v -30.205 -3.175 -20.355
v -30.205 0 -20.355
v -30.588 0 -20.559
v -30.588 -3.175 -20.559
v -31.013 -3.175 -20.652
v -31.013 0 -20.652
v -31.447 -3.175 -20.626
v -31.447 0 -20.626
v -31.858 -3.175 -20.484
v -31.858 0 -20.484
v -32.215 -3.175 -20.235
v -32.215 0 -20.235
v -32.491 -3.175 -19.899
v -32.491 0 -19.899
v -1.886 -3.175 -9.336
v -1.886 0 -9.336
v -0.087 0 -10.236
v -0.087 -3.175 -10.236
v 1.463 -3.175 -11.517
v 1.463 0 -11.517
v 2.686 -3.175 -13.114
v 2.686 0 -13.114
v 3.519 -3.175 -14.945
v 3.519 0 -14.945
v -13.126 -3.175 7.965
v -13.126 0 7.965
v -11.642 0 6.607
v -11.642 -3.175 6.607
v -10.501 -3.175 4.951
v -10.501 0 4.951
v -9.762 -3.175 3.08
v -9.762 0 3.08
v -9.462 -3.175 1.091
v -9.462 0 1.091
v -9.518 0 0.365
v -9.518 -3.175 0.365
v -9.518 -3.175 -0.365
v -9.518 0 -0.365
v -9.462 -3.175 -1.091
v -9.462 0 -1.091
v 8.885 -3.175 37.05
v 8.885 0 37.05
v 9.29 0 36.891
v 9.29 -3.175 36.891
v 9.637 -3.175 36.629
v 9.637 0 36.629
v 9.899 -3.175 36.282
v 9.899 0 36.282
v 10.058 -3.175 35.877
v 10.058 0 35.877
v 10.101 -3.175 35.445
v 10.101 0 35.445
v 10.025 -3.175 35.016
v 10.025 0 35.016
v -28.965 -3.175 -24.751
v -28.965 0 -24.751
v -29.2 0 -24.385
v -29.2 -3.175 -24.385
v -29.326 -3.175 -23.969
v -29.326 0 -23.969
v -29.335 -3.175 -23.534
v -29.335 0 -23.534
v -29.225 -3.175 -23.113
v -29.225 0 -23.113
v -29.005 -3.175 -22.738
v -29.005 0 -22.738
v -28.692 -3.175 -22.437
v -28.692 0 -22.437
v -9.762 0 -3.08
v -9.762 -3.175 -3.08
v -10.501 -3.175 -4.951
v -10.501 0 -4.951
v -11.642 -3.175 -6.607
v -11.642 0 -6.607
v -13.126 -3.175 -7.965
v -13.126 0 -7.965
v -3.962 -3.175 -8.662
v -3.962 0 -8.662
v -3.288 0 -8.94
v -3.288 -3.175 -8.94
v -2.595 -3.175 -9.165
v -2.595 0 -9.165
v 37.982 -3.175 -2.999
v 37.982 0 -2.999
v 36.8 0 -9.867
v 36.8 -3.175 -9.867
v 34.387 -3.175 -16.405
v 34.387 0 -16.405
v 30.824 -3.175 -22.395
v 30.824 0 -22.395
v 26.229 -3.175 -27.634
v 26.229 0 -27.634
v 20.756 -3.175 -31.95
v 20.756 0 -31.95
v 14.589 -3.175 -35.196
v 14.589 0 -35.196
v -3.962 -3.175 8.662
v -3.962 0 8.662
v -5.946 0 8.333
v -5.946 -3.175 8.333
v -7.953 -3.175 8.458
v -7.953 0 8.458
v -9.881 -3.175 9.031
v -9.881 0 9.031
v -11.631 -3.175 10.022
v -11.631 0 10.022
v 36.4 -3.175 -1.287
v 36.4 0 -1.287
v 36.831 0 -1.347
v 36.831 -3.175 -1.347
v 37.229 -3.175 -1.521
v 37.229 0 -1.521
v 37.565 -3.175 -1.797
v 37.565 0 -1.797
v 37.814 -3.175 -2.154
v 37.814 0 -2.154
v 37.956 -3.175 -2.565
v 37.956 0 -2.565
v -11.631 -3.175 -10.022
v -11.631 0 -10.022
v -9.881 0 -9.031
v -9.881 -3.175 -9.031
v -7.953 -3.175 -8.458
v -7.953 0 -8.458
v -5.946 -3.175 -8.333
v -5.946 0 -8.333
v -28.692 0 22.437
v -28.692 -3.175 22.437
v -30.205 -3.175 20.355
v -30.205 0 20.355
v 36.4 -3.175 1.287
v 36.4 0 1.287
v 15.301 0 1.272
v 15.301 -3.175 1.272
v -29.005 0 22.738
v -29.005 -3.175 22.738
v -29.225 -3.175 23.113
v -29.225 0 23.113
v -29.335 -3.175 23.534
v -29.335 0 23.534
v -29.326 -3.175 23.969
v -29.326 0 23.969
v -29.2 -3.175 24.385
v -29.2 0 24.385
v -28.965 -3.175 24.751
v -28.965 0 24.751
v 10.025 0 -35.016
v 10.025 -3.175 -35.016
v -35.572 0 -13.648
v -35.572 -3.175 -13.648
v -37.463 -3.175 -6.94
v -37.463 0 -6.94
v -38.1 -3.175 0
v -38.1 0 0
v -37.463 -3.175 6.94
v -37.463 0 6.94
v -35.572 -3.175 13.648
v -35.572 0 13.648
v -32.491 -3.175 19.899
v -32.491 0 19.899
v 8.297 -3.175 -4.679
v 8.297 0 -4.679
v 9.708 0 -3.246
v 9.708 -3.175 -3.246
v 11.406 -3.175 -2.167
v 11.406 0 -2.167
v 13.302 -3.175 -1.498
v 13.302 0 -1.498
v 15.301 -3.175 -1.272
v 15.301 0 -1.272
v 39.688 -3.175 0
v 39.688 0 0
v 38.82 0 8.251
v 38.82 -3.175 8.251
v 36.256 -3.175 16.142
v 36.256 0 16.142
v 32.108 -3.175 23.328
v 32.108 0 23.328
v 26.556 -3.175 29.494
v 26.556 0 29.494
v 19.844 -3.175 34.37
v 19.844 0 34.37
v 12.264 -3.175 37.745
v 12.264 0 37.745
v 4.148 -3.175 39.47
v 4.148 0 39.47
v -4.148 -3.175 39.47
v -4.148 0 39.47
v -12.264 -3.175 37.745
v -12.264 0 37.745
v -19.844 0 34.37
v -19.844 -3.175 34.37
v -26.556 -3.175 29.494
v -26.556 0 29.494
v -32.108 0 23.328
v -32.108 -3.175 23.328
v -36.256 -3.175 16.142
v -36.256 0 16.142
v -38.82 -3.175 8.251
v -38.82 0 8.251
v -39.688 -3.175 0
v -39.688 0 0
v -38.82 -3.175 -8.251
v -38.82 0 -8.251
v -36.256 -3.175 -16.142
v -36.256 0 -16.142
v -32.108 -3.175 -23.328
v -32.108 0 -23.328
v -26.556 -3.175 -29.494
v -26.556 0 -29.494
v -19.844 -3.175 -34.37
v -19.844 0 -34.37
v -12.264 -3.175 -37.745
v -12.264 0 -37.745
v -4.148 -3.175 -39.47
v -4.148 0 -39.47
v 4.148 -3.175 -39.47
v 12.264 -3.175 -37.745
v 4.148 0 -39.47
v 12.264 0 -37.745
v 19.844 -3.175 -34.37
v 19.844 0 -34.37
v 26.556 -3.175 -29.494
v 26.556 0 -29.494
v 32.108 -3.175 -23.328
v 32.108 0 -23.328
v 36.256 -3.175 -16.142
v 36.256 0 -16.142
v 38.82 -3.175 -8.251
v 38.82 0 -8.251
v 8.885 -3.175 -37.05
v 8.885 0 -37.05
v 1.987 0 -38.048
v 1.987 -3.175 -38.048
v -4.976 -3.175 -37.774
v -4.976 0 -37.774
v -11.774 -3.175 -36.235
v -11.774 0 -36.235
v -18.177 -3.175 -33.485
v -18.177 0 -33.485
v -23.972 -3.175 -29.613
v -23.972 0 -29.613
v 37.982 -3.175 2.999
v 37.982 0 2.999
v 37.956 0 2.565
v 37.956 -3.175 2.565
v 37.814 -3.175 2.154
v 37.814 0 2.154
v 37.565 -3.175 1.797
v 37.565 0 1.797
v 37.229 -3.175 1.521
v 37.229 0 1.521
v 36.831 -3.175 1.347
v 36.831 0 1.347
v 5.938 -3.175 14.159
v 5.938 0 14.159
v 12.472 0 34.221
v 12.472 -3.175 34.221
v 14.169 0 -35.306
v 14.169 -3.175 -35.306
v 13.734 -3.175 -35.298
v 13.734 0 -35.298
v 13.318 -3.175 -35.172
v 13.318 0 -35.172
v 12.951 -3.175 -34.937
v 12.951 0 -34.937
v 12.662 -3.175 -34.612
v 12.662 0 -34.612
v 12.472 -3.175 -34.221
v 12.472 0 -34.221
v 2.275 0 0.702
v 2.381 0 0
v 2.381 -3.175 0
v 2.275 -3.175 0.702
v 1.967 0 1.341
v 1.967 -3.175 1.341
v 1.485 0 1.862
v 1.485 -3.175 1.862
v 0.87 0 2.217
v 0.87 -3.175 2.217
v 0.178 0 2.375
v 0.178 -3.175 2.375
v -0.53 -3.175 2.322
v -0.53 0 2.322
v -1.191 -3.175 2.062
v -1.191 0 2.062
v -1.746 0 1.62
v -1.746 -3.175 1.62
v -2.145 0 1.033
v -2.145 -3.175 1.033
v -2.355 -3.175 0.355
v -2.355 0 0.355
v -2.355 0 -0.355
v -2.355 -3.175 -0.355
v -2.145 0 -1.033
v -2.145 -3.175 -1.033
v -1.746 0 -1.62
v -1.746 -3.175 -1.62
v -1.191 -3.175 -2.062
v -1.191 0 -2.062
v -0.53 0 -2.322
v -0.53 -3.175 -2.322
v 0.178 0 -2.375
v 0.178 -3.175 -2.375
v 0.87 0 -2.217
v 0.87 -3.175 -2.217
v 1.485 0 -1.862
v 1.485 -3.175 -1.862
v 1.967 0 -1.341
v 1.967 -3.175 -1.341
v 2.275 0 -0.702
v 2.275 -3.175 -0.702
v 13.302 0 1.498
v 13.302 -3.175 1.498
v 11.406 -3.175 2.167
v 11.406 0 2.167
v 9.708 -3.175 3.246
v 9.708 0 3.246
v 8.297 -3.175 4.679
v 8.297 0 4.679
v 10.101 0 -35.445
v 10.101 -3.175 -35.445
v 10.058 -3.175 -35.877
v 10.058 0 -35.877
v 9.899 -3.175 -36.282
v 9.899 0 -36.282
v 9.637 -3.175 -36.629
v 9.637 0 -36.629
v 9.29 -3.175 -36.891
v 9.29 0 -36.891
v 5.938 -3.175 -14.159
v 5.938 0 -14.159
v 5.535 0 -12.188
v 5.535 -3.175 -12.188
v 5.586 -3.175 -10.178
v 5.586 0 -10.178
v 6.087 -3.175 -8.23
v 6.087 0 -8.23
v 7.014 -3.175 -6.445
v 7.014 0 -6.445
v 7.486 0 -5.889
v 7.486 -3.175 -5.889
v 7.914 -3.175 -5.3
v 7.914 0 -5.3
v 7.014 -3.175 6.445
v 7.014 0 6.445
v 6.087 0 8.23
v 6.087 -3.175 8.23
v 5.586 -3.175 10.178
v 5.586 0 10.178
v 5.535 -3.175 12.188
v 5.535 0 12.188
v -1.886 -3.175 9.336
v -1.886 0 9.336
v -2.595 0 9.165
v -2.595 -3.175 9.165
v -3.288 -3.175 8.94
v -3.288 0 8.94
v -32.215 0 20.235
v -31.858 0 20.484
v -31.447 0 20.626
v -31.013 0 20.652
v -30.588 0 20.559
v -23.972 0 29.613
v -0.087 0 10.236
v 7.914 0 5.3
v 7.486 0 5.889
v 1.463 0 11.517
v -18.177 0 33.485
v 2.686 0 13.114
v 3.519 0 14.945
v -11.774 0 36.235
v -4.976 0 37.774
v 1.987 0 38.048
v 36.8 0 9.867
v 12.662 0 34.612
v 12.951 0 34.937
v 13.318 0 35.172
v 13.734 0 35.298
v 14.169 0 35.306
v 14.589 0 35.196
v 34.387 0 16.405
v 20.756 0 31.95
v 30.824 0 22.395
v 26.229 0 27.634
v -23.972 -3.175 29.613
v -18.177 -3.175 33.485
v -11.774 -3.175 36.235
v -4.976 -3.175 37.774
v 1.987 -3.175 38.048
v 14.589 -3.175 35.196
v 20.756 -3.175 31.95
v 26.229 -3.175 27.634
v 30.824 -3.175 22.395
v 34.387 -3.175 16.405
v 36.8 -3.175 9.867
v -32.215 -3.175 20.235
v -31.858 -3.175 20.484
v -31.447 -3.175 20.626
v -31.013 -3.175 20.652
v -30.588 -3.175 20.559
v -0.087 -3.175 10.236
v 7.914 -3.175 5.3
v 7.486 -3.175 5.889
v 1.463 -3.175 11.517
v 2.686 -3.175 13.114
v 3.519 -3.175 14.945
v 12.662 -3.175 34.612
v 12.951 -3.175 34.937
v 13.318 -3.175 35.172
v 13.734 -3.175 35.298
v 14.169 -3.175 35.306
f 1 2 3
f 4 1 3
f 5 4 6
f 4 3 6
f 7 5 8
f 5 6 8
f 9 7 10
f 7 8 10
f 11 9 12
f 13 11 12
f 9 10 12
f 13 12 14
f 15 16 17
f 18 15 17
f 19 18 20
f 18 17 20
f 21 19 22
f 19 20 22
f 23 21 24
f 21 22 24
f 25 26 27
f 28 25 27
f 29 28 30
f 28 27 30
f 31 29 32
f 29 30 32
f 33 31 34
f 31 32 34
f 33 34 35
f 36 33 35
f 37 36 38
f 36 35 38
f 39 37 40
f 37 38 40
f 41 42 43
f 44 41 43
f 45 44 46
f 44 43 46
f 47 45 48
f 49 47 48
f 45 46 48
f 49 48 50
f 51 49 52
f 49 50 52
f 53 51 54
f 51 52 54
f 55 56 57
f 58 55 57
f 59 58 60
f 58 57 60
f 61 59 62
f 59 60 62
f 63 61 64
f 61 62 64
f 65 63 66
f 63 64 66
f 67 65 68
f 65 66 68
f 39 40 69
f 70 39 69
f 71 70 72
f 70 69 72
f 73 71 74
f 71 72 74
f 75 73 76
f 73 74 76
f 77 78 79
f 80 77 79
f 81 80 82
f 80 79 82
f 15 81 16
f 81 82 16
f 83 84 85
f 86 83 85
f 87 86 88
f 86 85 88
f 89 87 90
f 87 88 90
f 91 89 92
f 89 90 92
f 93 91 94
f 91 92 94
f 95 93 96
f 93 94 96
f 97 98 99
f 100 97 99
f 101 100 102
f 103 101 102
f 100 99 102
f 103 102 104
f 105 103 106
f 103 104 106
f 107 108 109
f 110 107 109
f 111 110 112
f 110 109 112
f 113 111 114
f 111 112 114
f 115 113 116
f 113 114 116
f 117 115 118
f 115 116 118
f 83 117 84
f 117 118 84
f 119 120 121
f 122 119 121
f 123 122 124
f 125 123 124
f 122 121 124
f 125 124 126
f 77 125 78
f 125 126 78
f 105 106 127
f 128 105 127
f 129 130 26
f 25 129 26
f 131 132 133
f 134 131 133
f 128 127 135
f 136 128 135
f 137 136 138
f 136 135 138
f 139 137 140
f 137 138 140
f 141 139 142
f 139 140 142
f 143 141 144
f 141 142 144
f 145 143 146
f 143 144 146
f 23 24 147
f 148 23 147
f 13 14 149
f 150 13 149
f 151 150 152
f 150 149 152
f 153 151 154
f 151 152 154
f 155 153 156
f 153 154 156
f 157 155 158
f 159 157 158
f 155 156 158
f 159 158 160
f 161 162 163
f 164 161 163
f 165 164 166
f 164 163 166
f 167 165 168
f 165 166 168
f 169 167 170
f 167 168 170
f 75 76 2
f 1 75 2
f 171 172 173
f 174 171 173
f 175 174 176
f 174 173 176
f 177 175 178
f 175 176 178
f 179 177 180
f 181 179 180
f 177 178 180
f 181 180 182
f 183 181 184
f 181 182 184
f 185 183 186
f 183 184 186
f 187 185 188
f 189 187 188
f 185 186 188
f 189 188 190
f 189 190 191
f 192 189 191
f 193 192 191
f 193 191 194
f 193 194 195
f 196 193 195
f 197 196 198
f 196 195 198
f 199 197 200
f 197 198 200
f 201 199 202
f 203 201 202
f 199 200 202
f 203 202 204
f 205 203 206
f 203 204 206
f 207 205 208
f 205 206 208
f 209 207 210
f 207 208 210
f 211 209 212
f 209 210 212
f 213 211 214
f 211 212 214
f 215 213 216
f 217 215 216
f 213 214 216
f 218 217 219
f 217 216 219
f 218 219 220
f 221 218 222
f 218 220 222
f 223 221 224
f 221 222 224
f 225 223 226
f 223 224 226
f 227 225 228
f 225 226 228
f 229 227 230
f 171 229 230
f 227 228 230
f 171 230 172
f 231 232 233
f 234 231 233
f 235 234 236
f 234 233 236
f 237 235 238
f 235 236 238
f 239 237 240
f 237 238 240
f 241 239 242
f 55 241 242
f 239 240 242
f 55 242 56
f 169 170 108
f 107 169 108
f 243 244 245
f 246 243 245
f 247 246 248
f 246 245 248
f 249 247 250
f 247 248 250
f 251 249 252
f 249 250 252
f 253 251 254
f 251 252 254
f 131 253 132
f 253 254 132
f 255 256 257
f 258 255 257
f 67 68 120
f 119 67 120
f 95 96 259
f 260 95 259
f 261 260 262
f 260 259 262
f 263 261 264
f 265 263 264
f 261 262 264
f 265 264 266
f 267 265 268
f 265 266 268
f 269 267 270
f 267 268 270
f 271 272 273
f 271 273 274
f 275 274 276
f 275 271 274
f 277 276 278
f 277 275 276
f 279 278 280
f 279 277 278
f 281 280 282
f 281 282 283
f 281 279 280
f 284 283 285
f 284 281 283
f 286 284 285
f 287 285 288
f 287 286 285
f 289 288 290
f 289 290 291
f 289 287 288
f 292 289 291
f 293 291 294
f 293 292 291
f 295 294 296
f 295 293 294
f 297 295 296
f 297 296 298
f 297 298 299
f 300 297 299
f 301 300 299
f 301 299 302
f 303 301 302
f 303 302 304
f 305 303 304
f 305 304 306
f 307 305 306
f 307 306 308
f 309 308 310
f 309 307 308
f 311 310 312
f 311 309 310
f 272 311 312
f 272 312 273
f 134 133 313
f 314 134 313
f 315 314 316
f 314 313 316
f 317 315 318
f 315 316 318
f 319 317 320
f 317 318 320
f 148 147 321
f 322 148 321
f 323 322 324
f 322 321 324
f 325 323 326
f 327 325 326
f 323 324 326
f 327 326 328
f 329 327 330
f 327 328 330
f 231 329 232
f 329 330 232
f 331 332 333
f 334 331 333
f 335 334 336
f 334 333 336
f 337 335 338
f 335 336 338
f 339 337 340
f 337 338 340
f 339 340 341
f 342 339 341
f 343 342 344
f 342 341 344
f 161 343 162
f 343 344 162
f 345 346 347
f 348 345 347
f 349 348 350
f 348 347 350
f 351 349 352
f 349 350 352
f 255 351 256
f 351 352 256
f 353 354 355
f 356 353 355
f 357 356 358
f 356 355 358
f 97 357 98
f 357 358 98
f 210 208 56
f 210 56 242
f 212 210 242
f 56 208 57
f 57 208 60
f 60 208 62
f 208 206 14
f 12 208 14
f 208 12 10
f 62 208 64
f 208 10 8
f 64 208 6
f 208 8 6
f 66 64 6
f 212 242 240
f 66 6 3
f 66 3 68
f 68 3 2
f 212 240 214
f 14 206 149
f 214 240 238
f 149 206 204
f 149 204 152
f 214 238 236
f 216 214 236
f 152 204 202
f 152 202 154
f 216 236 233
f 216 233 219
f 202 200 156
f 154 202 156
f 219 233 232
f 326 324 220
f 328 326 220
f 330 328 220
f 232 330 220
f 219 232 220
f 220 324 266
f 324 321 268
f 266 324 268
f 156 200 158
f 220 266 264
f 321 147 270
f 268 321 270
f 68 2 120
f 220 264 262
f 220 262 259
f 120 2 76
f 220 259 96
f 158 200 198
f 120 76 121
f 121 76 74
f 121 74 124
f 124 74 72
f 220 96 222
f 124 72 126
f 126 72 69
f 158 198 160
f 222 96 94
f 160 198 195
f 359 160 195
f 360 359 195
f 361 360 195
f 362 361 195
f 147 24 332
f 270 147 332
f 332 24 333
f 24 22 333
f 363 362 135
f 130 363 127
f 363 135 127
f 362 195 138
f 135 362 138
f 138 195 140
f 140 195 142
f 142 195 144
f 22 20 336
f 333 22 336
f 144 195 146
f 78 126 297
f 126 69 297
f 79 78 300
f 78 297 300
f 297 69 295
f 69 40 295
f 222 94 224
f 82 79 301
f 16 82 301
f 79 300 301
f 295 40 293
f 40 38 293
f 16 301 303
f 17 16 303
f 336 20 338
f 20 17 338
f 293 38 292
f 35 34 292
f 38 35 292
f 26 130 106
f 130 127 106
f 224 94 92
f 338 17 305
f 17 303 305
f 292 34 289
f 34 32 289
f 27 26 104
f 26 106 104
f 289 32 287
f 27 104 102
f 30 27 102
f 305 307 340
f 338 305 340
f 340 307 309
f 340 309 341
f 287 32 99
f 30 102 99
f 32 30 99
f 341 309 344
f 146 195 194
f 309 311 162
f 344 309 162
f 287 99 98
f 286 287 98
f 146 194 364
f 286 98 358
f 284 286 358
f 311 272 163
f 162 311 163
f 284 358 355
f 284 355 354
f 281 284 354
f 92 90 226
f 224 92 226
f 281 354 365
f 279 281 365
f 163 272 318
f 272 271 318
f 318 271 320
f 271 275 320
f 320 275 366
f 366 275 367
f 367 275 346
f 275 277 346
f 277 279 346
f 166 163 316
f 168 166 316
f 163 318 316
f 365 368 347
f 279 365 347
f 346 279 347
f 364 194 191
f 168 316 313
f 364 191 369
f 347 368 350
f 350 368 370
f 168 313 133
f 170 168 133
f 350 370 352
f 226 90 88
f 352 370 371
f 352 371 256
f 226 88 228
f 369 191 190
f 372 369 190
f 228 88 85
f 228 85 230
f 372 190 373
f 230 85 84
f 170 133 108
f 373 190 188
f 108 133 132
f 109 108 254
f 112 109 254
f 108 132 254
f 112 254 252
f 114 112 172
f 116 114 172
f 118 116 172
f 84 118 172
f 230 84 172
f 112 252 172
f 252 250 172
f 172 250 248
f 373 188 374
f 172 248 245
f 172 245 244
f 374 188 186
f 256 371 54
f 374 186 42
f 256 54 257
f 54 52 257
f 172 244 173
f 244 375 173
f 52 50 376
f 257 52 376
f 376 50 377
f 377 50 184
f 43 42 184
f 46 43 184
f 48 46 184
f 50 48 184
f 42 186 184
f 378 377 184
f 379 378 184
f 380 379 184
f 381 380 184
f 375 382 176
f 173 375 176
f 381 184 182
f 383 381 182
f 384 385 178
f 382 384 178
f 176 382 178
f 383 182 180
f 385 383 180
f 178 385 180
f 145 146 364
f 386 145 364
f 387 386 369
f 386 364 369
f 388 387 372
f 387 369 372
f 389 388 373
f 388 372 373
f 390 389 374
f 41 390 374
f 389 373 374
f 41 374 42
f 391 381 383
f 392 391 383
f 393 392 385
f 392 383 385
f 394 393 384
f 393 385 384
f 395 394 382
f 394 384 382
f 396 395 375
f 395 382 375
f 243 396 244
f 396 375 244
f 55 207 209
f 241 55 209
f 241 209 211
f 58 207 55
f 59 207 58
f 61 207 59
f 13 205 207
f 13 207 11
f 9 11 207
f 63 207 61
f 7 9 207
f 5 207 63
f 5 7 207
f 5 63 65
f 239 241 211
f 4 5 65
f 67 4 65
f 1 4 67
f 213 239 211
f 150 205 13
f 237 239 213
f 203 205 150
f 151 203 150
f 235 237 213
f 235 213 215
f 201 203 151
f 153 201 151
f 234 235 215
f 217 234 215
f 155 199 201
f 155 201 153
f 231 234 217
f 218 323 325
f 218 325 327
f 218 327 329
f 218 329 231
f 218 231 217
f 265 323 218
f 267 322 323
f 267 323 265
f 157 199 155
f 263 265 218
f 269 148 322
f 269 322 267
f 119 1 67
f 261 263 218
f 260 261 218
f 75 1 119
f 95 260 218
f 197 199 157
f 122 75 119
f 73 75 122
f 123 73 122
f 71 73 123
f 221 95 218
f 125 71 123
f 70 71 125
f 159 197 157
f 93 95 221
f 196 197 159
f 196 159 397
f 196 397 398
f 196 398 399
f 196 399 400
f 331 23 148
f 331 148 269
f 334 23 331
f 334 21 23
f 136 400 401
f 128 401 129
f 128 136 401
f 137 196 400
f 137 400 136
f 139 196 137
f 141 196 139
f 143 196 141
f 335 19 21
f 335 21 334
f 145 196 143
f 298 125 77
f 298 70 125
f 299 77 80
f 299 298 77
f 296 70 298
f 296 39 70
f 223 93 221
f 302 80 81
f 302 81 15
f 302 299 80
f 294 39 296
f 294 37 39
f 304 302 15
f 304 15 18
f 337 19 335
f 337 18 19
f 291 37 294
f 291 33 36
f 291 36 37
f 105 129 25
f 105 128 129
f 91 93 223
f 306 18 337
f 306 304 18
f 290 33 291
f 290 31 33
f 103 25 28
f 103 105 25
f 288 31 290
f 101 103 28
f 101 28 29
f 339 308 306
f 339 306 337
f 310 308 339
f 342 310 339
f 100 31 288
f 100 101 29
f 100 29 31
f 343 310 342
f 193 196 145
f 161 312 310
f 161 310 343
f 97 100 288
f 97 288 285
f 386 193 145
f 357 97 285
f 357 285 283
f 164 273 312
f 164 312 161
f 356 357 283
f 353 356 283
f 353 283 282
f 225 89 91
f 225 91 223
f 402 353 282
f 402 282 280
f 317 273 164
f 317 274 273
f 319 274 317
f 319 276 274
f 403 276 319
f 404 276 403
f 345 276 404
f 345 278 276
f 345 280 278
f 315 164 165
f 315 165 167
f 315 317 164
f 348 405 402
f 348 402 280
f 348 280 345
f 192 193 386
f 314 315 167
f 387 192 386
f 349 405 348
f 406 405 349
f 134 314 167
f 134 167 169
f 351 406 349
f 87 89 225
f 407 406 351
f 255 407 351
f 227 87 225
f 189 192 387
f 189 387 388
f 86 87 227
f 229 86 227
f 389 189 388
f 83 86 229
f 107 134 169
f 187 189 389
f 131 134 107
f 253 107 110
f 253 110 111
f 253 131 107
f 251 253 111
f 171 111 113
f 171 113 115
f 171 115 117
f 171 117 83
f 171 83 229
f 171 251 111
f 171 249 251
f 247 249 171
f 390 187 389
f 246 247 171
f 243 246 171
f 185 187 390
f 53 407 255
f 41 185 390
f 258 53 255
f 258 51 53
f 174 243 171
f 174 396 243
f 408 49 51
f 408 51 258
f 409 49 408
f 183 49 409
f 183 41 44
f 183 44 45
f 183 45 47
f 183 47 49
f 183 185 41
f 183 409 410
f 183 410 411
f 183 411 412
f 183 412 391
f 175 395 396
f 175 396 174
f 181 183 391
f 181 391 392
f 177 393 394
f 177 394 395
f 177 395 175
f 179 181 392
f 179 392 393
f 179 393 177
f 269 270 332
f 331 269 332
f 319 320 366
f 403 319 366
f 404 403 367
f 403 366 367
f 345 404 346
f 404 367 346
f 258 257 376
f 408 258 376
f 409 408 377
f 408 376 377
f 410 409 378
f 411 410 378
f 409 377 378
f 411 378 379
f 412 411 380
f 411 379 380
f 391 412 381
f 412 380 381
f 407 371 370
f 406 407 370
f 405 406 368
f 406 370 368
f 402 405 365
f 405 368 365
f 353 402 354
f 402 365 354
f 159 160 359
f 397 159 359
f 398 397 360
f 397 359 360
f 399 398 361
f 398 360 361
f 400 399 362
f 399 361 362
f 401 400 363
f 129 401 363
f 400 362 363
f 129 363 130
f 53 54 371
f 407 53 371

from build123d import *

# Parameters (mm, degrees)
F0_R     = 39.6875
F0_R_2   = 2.38125
F1_DEPTH = 3.175


with BuildPart() as f1:
    # F0 (on Front) → F1 (new body)
    with BuildSketch(Plane.XZ):
        Circle(F0_R)
        with BuildLine():
            Line((-28.692183, -22.436528), (-11.631072, -10.022431))
            ThreePointArc((-11.631072, -10.022431), (-7.953459, -8.457568), (-3.961983, -8.661889))
            ThreePointArc((-3.961983, -8.661889), (-2.943387, -9.058813), (-1.886019, -9.33641))
            ThreePointArc((-1.886019, -9.33641), (1.46325, -11.517242), (3.518698, -14.944889))
            Line((3.518698, -14.944889), (10.024603, -35.016374))
            ThreePointArc((10.024603, -35.016374), (9.899166, -36.282225), (8.884648, -37.049602))
            ThreePointArc((8.884648, -37.049602), (-11.773547, -36.235253), (-28.965041, -24.751493))
            ThreePointArc((-28.965041, -24.751493), (-29.334751, -23.534353), (-28.692183, -22.436528))
        make_face(mode=Mode.SUBTRACT)
        with BuildLine():
            ThreePointArc((8.296642, -4.67882), (11.405717, -2.16739), (15.300772, -1.271745))
            Line((15.300772, -1.271745), (36.400324, -1.28669))
            ThreePointArc((36.400324, -1.28669), (37.565457, -1.797158), (37.981773, -2.999155))
            ThreePointArc((37.981773, -2.999155), (30.823547, -22.394618), (14.589379, -35.196023))
            ThreePointArc((14.589379, -35.196023), (13.317564, -35.171521), (12.472034, -34.221156))
            Line((12.472034, -34.221156), (5.937699, -14.158908))
            ThreePointArc((5.937699, -14.158908), (5.585871, -10.177722), (7.013626, -6.444741))
            ThreePointArc((7.013626, -6.444741), (7.705887, -5.598655), (8.296642, -4.67882))
        make_face(mode=Mode.SUBTRACT)
        with BuildLine():
            Line((-30.204778, 20.354619), (-13.126097, 7.964705))
            ThreePointArc((-13.126097, 7.964705), (-10.501379, 4.950657), (-9.462266, 1.091399))
            ThreePointArc((-9.462266, 1.091399), (-9.525, 0), (-9.462266, -1.091399))
            ThreePointArc((-9.462266, -1.091399), (-10.501379, -4.950657), (-13.126097, -7.964705))
            Line((-13.126097, -7.964705), (-30.204778, -20.354619))
            ThreePointArc((-30.204778, -20.354619), (-31.447436, -20.626491), (-32.490759, -19.898759))
            ThreePointArc((-32.490759, -19.898759), (-38.1, 0), (-32.490759, 19.898759))
            ThreePointArc((-32.490759, 19.898759), (-31.447436, 20.626491), (-30.204778, 20.354619))
        make_face(mode=Mode.SUBTRACT)
        with BuildLine():
            Line((10.024603, 35.016374), (3.518698, 14.944889))
            ThreePointArc((3.518698, 14.944889), (1.46325, 11.517242), (-1.886019, 9.33641))
            ThreePointArc((-1.886019, 9.33641), (-2.943387, 9.058813), (-3.961983, 8.661889))
            ThreePointArc((-3.961983, 8.661889), (-7.953459, 8.457568), (-11.631072, 10.022431))
            Line((-11.631072, 10.022431), (-28.692183, 22.436528))
            ThreePointArc((-28.692183, 22.436528), (-29.334751, 23.534353), (-28.965041, 24.751493))
            ThreePointArc((-28.965041, 24.751493), (-11.773547, 36.235253), (8.884648, 37.049602))
            ThreePointArc((8.884648, 37.049602), (9.899166, 36.282225), (10.024603, 35.016374))
        make_face(mode=Mode.SUBTRACT)
        Circle(F0_R_2, mode=Mode.SUBTRACT)
        with BuildLine():
            ThreePointArc((14.589379, 35.196023), (30.823547, 22.394618), (37.981773, 2.999155))
            ThreePointArc((37.981773, 2.999155), (37.565457, 1.797158), (36.400324, 1.28669))
            Line((36.400324, 1.28669), (15.300772, 1.271745))
            ThreePointArc((15.300772, 1.271745), (11.405717, 2.16739), (8.296642, 4.67882))
            ThreePointArc((8.296642, 4.67882), (7.705887, 5.598655), (7.013626, 6.444741))
            ThreePointArc((7.013626, 6.444741), (5.585871, 10.177722), (5.937699, 14.158908))
            Line((5.937699, 14.158908), (12.472034, 34.221156))
            ThreePointArc((12.472034, 34.221156), (13.317564, 35.171521), (14.589379, 35.196023))
        make_face(mode=Mode.SUBTRACT)
    extrude(amount=F1_DEPTH)


solid = f1.part
